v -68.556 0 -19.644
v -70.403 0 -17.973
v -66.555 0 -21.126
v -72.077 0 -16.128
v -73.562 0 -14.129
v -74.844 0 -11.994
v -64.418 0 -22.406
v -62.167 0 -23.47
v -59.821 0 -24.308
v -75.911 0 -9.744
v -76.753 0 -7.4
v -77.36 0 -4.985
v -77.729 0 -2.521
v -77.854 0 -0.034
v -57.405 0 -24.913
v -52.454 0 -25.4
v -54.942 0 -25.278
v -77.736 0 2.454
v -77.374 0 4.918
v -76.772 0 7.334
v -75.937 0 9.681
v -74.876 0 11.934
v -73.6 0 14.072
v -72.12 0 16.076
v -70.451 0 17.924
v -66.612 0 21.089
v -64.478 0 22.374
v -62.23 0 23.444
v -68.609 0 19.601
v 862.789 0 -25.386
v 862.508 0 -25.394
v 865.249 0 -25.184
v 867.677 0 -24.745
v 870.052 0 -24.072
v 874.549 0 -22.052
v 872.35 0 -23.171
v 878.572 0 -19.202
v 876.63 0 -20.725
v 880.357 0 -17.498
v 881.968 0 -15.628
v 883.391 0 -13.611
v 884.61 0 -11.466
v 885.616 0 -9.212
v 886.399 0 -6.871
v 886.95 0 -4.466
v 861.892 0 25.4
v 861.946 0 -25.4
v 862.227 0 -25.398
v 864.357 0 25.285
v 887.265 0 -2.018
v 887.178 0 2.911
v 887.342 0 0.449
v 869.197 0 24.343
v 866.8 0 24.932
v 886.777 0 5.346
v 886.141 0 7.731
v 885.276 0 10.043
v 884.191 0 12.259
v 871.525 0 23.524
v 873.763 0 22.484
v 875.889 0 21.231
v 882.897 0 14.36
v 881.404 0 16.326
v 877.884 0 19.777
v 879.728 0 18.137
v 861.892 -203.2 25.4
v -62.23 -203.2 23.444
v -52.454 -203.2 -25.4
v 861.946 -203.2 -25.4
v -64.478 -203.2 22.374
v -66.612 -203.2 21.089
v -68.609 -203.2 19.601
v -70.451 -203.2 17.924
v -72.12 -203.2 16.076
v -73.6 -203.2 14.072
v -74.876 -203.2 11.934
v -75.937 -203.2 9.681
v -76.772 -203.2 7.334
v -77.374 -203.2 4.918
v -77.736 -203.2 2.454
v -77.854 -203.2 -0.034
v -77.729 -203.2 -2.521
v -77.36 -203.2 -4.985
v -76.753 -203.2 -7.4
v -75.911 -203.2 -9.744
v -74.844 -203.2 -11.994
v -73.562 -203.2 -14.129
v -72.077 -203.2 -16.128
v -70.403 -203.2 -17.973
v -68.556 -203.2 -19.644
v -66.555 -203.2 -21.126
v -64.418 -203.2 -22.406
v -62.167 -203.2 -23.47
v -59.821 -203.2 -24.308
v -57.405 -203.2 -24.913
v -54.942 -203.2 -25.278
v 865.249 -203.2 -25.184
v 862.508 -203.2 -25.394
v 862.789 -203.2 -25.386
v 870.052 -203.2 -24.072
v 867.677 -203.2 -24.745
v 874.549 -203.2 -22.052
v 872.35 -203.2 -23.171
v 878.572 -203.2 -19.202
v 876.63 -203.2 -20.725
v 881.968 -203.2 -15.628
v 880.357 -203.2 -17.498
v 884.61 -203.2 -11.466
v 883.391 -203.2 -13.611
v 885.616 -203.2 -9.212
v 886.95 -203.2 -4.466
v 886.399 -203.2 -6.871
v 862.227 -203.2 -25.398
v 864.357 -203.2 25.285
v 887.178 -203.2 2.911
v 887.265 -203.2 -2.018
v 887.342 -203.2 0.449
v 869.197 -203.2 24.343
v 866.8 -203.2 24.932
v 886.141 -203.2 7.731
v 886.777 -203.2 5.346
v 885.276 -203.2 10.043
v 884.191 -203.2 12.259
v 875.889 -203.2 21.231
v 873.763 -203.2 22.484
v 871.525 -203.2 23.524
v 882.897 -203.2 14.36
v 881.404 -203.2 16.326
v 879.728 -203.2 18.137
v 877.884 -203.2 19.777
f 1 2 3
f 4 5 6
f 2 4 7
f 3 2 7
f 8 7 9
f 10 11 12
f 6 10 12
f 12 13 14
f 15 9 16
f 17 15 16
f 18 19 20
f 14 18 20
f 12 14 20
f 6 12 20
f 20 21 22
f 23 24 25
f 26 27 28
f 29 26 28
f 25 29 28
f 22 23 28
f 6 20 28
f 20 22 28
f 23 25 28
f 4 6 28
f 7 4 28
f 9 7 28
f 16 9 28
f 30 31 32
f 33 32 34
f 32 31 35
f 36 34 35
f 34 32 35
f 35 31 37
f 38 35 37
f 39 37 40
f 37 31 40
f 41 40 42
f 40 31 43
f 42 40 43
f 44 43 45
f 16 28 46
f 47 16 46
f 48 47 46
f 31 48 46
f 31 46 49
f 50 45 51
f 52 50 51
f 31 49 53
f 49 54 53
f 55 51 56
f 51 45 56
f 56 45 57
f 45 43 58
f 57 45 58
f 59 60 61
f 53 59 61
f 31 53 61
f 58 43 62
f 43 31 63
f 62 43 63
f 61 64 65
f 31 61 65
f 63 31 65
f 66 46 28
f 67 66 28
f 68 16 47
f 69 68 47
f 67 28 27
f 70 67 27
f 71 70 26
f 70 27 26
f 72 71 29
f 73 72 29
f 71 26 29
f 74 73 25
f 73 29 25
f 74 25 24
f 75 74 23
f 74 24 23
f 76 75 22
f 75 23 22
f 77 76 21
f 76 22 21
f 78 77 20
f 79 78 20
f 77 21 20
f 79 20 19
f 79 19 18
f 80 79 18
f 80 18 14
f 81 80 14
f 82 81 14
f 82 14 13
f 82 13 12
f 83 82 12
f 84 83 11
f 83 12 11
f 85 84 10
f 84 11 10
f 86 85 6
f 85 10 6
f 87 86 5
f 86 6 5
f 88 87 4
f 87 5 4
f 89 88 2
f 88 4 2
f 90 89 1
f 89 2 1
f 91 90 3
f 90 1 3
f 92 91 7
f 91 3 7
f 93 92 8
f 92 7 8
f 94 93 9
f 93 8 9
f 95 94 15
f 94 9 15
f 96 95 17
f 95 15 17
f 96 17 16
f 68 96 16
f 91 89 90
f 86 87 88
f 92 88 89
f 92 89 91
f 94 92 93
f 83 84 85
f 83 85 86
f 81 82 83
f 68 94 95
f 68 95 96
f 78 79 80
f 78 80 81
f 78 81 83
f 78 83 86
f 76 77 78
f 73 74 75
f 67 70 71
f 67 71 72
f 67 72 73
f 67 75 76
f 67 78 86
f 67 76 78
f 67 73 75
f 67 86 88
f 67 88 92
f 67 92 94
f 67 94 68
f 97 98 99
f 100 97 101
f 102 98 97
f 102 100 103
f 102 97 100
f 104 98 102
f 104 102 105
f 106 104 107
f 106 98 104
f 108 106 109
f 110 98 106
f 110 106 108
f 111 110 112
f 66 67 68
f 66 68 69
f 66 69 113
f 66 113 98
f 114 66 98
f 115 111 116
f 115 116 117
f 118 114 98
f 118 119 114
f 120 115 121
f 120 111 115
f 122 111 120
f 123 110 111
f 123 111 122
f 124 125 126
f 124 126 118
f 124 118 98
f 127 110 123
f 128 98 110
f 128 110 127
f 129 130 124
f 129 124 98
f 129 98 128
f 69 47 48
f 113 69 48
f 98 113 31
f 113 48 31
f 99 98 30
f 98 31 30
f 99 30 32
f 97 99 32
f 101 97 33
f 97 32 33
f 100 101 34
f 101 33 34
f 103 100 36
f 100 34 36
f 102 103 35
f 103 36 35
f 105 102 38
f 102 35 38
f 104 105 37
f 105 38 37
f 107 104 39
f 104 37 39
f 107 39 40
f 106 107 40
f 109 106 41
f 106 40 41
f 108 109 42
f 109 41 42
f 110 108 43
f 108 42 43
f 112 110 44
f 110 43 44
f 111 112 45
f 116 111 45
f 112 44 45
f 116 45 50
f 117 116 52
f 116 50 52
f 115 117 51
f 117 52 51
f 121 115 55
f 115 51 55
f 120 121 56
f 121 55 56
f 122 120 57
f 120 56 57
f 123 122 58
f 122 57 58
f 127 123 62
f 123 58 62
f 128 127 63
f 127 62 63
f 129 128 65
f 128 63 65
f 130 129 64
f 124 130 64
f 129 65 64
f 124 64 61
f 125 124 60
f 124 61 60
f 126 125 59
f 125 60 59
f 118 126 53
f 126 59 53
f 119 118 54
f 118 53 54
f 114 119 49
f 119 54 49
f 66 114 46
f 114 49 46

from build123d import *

# Parameters (mm, degrees)
F1_DEPTH = 203.2


with BuildPart() as f1:
    # F0 (on Front) → F1 (new body)
    with BuildSketch(Plane.XZ):
        with BuildLine():
            Line((-42.7784153649, 23.4848271869), (-62.2295438798, 23.4436506788))
            ThreePointArc((-62.2295438798, 23.4436506788), (-77.3604186448, -4.984539736), (-52.4543076754, -25.4))
            ThreePointArc((-52.4543076754, -25.4), (-34.4937954332, -17.9605122421), (-27.0543076754, 0))
            ThreePointArc((-27.0543076754, 0), (-31.348293548, 14.1313894454), (-42.7784153649, 23.4848271869))
        make_face()
        with BuildLine():
            Line((861.8919226443, 25.399943087), (-42.7784153649, 23.4848271869))
            ThreePointArc((-42.7784153649, 23.4848271869), (-31.348293548, 14.1313894454), (-27.0543076754, 0))
            Line((-27.0543076754, 0), (836.5456923246, 0))
            ThreePointArc((836.5456923246, 0), (843.96617968, 17.9414917178), (861.8919226443, 25.399943087))
        make_face()
        with BuildLine():
            ThreePointArc((-27.0543076754, 0), (-34.4937954332, -17.9605122421), (-52.4543076754, -25.4))
            Line((-52.4543076754, -25.4), (861.9456923246, -25.4))
            ThreePointArc((861.9456923246, -25.4), (843.9851800825, -17.9605122421), (836.5456923246, 0))
            Line((836.5456923246, 0), (-27.0543076754, 0))
        make_face()
        with BuildLine():
            ThreePointArc((887.3456923246, 0), (879.8871840424, 17.9795126447), (861.8919226443, 25.399943087))
            Line((861.8919226443, 25.399943087), (862.7891166971, -25.3859928962))
            ThreePointArc((862.7891166971, -25.3859928962), (880.2019649324, -17.659799276), (887.3456923246, 0))
        make_face()
        with BuildLine():
            ThreePointArc((836.5456923246, 0), (843.9851800825, -17.9605122421), (861.9456923246, -25.4))
            ThreePointArc((861.9456923246, -25.4), (862.3674626623, -25.3964979826), (862.7891166971, -25.3859928962))
            Line((862.7891166971, -25.3859928962), (861.8919226443, 25.399943087))
            ThreePointArc((861.8919226443, 25.399943087), (843.96617968, 17.9414917178), (836.5456923246, 0))
        make_face()
    extrude(amount=F1_DEPTH)


solid = f1.part
